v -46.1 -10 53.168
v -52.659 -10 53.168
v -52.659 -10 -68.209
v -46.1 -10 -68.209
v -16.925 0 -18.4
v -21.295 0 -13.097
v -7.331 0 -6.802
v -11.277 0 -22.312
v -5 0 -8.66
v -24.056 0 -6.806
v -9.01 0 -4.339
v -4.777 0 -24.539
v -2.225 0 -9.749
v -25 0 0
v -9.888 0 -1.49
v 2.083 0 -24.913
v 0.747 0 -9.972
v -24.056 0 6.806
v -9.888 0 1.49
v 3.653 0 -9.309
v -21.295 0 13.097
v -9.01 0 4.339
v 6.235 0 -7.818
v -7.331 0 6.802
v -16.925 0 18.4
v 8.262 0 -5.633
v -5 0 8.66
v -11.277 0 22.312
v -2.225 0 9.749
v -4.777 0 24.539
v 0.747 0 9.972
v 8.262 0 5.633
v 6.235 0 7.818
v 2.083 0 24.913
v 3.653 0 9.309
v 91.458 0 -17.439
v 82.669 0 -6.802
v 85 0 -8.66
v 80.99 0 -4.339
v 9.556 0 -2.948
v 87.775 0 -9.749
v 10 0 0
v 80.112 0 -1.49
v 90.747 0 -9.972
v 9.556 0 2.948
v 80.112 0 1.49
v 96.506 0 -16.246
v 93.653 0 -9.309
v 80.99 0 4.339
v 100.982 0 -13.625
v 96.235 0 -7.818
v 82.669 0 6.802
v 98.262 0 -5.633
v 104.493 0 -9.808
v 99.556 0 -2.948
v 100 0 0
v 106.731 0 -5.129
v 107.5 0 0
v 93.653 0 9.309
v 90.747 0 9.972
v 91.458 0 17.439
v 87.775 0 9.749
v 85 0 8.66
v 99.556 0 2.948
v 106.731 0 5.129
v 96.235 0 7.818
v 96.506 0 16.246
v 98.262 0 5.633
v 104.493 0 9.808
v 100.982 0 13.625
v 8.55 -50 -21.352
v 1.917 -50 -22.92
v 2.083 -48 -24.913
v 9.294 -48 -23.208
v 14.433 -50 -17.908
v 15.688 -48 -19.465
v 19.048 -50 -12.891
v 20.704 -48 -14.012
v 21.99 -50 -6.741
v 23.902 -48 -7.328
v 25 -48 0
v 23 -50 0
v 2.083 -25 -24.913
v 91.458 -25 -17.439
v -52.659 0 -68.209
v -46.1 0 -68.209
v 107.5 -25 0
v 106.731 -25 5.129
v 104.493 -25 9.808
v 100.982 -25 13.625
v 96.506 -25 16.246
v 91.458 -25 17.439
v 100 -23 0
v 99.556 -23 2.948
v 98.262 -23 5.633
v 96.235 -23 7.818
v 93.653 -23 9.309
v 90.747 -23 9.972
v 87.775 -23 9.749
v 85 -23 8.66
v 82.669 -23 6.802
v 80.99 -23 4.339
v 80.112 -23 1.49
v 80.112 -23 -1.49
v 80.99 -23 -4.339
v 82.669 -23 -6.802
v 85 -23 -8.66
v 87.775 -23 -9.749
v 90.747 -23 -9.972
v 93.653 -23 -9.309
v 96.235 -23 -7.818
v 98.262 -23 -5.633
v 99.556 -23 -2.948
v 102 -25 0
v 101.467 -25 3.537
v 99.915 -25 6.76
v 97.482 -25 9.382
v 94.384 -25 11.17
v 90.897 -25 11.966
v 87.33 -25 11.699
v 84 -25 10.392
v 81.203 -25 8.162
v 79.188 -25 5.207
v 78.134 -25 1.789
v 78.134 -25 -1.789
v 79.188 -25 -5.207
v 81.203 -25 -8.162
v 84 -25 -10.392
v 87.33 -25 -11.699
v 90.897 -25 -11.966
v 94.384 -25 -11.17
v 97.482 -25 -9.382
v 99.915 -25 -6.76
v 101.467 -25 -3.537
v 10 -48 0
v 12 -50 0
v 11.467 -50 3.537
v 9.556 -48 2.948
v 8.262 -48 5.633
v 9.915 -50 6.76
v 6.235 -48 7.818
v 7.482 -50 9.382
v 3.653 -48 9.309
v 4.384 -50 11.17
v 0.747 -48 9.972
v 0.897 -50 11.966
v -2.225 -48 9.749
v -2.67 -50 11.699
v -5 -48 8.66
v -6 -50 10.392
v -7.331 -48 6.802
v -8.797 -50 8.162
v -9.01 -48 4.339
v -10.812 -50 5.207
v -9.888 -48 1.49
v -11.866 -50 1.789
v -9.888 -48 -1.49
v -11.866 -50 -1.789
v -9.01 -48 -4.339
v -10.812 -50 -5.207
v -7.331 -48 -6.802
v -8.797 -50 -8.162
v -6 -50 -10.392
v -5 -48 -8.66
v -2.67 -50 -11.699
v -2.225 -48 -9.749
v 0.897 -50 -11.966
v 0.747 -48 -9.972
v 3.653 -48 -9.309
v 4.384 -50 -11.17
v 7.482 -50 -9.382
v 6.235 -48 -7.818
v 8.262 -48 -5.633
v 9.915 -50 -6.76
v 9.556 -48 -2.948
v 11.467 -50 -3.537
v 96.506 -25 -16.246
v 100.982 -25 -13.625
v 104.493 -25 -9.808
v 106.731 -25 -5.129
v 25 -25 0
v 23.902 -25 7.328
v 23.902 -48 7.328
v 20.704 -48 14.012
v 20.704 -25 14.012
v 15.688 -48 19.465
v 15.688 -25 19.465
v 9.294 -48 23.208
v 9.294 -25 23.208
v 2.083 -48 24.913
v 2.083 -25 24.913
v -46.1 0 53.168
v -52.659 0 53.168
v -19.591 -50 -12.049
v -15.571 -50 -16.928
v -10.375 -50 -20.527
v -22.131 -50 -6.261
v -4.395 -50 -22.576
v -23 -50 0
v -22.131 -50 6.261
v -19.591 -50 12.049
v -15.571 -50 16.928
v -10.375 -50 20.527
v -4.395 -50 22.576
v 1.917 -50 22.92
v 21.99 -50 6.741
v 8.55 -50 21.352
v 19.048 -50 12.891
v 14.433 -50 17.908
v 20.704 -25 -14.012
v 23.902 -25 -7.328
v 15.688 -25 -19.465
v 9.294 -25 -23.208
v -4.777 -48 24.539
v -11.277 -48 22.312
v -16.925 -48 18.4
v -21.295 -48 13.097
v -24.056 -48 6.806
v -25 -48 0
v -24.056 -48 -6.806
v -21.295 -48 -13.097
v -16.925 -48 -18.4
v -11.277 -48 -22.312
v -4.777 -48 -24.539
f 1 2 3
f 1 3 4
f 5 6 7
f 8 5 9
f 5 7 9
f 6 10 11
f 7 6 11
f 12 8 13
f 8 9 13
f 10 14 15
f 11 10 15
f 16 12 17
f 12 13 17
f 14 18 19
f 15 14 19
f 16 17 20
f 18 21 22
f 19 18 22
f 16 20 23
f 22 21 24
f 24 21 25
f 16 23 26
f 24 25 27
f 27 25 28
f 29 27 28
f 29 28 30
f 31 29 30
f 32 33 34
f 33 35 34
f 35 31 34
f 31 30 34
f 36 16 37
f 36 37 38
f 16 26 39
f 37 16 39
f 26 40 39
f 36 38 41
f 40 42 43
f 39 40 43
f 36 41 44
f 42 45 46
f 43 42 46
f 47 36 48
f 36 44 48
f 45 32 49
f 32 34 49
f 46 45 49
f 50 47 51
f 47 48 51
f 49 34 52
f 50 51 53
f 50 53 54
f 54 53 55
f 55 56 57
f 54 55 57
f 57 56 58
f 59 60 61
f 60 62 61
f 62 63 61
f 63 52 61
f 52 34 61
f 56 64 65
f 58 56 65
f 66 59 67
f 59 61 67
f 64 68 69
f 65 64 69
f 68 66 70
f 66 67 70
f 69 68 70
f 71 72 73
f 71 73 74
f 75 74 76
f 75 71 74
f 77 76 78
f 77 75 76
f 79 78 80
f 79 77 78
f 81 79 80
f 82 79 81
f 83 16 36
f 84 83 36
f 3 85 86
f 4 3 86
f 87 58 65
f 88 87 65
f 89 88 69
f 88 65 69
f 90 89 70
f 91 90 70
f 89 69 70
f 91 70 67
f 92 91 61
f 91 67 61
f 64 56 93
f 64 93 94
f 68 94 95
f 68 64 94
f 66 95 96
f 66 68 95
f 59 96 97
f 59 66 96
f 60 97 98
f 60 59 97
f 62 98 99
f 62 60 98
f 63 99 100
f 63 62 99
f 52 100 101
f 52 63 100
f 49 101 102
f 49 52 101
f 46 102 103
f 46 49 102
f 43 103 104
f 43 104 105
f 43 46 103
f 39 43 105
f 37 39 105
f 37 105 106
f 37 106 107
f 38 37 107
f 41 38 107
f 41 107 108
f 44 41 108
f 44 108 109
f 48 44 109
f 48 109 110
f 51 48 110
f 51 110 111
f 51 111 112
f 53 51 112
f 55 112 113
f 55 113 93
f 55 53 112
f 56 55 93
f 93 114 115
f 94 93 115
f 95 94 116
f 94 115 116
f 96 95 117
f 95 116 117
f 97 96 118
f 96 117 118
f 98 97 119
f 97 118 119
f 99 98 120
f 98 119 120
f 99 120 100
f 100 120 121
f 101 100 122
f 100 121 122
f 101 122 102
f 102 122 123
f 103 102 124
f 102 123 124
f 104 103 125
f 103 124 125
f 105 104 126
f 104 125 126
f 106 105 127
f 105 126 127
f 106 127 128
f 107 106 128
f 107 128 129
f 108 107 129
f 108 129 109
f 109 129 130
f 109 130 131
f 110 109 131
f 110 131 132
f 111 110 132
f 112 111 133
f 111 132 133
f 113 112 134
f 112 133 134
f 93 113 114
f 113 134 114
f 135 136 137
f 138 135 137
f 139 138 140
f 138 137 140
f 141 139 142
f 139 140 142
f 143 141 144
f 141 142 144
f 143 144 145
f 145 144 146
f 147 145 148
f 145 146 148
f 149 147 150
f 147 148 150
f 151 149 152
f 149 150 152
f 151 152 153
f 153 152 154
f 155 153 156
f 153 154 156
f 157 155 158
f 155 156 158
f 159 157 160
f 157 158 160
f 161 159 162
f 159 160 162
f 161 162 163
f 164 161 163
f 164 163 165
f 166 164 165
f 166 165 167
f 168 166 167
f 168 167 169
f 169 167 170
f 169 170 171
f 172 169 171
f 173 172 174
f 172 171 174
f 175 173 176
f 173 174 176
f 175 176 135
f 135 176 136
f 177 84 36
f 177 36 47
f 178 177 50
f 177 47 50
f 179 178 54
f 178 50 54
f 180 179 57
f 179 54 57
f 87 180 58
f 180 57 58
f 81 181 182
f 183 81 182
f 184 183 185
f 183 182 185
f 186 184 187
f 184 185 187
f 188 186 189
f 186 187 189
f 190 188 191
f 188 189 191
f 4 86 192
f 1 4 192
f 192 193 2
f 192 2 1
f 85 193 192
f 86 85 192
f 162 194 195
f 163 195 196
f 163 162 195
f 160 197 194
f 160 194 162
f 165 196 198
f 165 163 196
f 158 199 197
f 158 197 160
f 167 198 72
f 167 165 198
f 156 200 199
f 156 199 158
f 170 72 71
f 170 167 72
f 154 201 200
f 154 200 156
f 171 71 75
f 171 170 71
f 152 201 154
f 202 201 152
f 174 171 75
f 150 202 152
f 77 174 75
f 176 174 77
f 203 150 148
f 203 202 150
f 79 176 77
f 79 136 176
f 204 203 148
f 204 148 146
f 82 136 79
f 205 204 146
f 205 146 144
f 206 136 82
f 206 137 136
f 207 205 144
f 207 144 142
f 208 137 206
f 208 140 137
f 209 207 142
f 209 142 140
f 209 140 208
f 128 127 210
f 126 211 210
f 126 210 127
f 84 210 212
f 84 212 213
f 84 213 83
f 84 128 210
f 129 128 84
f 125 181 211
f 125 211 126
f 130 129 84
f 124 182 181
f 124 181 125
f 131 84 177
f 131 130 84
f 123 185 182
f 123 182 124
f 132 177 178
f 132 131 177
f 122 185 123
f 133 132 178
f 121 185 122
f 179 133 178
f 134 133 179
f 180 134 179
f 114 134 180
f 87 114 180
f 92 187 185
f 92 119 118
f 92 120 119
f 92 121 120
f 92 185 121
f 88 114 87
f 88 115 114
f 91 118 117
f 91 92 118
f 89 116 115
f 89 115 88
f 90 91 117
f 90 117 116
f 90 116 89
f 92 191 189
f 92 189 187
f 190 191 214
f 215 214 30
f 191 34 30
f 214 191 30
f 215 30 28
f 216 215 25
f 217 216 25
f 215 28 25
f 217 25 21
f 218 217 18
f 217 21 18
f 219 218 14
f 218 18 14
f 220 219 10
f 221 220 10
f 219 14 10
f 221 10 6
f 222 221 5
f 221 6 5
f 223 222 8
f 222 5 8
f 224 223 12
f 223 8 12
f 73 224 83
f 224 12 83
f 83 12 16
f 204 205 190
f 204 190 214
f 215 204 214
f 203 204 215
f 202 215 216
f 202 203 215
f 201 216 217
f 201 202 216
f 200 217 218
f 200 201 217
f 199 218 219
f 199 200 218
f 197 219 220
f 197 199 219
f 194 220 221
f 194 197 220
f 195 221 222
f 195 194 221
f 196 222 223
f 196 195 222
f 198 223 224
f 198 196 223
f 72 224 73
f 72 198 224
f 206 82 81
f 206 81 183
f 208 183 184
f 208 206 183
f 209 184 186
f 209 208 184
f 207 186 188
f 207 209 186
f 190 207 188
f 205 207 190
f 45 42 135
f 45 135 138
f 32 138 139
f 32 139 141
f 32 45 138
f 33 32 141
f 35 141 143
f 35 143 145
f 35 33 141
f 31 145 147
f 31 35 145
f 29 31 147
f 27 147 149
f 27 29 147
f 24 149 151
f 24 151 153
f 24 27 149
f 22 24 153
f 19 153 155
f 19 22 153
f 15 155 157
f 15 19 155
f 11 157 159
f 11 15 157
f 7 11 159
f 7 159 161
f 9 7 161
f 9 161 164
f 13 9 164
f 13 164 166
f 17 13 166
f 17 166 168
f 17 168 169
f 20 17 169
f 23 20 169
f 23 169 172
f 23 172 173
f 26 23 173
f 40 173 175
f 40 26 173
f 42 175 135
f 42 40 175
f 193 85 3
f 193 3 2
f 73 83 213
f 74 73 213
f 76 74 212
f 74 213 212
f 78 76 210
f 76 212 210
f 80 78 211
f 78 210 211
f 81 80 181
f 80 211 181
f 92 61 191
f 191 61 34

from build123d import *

# Parameters (mm, degrees)
F0_R     = 10
F1_DEPTH = 25
F2_DEPTH = 50
F3_SIZE  = 2
F4_W     = 6.558575
F4_H     = 121.377379
F5_DEPTH = 10


with BuildPart() as f1:
    # F0 (on Front) → F1 (new body)
    with BuildSketch(Plane.XZ):
        with BuildLine():
            ThreePointArc((2.083333, -24.913043), (18.399502, -16.92508), (25, 0))
            ThreePointArc((25, 0), (18.399502, 16.92508), (2.083333, 24.913043))
            ThreePointArc((2.083333, 24.913043), (-25, 0), (2.083333, -24.913043))
        make_face()
        Circle(F0_R, mode=Mode.SUBTRACT)
        with BuildLine():
            ThreePointArc((2.083333, 24.913043), (18.399502, 16.92508), (25, 0))
            ThreePointArc((25, 0), (18.399502, -16.92508), (2.083333, -24.913043))
            Line((2.083333, -24.913043), (91.458333, -17.43913))
            ThreePointArc((91.458333, -17.43913), (72.5, 0), (91.458333, 17.43913))
            Line((91.458333, 17.43913), (2.083333, 24.913043))
        make_face()
        with BuildLine():
            ThreePointArc((107.5, 0), (102.879651, 11.847556), (91.458333, 17.43913))
            ThreePointArc((91.458333, 17.43913), (72.5, 0), (91.458333, -17.43913))
            ThreePointArc((91.458333, -17.43913), (102.879651, -11.847556), (107.5, 0))
        make_face()
        with Locations((90, 0)):
            Circle(F0_R, mode=Mode.SUBTRACT)
    extrude(amount=F1_DEPTH)

    # F0 (on Front) → F2 (join)
    with BuildSketch(Plane.XZ):
        with BuildLine():
            ThreePointArc((2.083333, -24.913043), (18.399502, -16.92508), (25, 0))
            ThreePointArc((25, 0), (18.399502, 16.92508), (2.083333, 24.913043))
            ThreePointArc((2.083333, 24.913043), (-25, 0), (2.083333, -24.913043))
        make_face()
        Circle(F0_R, mode=Mode.SUBTRACT)
    extrude(amount=F2_DEPTH)

    # F3
    f3_edges = [f1.edges().sort_by_distance(p)[0] for p in [
        (-2.083333, -50, 24.913043),
        (-10, -50, 0),
        (80, -25, 0),
    ]]
    chamfer(f3_edges, length=F3_SIZE)


with BuildPart() as f5:
    # F4 (on Front) → F5 (new body)
    with BuildSketch(Plane.XZ):
        with Locations((-49.37948, -7.520497)):
            Rectangle(F4_W, F4_H)
    extrude(amount=F5_DEPTH)


solid = Compound([f1.part, f5.part])
